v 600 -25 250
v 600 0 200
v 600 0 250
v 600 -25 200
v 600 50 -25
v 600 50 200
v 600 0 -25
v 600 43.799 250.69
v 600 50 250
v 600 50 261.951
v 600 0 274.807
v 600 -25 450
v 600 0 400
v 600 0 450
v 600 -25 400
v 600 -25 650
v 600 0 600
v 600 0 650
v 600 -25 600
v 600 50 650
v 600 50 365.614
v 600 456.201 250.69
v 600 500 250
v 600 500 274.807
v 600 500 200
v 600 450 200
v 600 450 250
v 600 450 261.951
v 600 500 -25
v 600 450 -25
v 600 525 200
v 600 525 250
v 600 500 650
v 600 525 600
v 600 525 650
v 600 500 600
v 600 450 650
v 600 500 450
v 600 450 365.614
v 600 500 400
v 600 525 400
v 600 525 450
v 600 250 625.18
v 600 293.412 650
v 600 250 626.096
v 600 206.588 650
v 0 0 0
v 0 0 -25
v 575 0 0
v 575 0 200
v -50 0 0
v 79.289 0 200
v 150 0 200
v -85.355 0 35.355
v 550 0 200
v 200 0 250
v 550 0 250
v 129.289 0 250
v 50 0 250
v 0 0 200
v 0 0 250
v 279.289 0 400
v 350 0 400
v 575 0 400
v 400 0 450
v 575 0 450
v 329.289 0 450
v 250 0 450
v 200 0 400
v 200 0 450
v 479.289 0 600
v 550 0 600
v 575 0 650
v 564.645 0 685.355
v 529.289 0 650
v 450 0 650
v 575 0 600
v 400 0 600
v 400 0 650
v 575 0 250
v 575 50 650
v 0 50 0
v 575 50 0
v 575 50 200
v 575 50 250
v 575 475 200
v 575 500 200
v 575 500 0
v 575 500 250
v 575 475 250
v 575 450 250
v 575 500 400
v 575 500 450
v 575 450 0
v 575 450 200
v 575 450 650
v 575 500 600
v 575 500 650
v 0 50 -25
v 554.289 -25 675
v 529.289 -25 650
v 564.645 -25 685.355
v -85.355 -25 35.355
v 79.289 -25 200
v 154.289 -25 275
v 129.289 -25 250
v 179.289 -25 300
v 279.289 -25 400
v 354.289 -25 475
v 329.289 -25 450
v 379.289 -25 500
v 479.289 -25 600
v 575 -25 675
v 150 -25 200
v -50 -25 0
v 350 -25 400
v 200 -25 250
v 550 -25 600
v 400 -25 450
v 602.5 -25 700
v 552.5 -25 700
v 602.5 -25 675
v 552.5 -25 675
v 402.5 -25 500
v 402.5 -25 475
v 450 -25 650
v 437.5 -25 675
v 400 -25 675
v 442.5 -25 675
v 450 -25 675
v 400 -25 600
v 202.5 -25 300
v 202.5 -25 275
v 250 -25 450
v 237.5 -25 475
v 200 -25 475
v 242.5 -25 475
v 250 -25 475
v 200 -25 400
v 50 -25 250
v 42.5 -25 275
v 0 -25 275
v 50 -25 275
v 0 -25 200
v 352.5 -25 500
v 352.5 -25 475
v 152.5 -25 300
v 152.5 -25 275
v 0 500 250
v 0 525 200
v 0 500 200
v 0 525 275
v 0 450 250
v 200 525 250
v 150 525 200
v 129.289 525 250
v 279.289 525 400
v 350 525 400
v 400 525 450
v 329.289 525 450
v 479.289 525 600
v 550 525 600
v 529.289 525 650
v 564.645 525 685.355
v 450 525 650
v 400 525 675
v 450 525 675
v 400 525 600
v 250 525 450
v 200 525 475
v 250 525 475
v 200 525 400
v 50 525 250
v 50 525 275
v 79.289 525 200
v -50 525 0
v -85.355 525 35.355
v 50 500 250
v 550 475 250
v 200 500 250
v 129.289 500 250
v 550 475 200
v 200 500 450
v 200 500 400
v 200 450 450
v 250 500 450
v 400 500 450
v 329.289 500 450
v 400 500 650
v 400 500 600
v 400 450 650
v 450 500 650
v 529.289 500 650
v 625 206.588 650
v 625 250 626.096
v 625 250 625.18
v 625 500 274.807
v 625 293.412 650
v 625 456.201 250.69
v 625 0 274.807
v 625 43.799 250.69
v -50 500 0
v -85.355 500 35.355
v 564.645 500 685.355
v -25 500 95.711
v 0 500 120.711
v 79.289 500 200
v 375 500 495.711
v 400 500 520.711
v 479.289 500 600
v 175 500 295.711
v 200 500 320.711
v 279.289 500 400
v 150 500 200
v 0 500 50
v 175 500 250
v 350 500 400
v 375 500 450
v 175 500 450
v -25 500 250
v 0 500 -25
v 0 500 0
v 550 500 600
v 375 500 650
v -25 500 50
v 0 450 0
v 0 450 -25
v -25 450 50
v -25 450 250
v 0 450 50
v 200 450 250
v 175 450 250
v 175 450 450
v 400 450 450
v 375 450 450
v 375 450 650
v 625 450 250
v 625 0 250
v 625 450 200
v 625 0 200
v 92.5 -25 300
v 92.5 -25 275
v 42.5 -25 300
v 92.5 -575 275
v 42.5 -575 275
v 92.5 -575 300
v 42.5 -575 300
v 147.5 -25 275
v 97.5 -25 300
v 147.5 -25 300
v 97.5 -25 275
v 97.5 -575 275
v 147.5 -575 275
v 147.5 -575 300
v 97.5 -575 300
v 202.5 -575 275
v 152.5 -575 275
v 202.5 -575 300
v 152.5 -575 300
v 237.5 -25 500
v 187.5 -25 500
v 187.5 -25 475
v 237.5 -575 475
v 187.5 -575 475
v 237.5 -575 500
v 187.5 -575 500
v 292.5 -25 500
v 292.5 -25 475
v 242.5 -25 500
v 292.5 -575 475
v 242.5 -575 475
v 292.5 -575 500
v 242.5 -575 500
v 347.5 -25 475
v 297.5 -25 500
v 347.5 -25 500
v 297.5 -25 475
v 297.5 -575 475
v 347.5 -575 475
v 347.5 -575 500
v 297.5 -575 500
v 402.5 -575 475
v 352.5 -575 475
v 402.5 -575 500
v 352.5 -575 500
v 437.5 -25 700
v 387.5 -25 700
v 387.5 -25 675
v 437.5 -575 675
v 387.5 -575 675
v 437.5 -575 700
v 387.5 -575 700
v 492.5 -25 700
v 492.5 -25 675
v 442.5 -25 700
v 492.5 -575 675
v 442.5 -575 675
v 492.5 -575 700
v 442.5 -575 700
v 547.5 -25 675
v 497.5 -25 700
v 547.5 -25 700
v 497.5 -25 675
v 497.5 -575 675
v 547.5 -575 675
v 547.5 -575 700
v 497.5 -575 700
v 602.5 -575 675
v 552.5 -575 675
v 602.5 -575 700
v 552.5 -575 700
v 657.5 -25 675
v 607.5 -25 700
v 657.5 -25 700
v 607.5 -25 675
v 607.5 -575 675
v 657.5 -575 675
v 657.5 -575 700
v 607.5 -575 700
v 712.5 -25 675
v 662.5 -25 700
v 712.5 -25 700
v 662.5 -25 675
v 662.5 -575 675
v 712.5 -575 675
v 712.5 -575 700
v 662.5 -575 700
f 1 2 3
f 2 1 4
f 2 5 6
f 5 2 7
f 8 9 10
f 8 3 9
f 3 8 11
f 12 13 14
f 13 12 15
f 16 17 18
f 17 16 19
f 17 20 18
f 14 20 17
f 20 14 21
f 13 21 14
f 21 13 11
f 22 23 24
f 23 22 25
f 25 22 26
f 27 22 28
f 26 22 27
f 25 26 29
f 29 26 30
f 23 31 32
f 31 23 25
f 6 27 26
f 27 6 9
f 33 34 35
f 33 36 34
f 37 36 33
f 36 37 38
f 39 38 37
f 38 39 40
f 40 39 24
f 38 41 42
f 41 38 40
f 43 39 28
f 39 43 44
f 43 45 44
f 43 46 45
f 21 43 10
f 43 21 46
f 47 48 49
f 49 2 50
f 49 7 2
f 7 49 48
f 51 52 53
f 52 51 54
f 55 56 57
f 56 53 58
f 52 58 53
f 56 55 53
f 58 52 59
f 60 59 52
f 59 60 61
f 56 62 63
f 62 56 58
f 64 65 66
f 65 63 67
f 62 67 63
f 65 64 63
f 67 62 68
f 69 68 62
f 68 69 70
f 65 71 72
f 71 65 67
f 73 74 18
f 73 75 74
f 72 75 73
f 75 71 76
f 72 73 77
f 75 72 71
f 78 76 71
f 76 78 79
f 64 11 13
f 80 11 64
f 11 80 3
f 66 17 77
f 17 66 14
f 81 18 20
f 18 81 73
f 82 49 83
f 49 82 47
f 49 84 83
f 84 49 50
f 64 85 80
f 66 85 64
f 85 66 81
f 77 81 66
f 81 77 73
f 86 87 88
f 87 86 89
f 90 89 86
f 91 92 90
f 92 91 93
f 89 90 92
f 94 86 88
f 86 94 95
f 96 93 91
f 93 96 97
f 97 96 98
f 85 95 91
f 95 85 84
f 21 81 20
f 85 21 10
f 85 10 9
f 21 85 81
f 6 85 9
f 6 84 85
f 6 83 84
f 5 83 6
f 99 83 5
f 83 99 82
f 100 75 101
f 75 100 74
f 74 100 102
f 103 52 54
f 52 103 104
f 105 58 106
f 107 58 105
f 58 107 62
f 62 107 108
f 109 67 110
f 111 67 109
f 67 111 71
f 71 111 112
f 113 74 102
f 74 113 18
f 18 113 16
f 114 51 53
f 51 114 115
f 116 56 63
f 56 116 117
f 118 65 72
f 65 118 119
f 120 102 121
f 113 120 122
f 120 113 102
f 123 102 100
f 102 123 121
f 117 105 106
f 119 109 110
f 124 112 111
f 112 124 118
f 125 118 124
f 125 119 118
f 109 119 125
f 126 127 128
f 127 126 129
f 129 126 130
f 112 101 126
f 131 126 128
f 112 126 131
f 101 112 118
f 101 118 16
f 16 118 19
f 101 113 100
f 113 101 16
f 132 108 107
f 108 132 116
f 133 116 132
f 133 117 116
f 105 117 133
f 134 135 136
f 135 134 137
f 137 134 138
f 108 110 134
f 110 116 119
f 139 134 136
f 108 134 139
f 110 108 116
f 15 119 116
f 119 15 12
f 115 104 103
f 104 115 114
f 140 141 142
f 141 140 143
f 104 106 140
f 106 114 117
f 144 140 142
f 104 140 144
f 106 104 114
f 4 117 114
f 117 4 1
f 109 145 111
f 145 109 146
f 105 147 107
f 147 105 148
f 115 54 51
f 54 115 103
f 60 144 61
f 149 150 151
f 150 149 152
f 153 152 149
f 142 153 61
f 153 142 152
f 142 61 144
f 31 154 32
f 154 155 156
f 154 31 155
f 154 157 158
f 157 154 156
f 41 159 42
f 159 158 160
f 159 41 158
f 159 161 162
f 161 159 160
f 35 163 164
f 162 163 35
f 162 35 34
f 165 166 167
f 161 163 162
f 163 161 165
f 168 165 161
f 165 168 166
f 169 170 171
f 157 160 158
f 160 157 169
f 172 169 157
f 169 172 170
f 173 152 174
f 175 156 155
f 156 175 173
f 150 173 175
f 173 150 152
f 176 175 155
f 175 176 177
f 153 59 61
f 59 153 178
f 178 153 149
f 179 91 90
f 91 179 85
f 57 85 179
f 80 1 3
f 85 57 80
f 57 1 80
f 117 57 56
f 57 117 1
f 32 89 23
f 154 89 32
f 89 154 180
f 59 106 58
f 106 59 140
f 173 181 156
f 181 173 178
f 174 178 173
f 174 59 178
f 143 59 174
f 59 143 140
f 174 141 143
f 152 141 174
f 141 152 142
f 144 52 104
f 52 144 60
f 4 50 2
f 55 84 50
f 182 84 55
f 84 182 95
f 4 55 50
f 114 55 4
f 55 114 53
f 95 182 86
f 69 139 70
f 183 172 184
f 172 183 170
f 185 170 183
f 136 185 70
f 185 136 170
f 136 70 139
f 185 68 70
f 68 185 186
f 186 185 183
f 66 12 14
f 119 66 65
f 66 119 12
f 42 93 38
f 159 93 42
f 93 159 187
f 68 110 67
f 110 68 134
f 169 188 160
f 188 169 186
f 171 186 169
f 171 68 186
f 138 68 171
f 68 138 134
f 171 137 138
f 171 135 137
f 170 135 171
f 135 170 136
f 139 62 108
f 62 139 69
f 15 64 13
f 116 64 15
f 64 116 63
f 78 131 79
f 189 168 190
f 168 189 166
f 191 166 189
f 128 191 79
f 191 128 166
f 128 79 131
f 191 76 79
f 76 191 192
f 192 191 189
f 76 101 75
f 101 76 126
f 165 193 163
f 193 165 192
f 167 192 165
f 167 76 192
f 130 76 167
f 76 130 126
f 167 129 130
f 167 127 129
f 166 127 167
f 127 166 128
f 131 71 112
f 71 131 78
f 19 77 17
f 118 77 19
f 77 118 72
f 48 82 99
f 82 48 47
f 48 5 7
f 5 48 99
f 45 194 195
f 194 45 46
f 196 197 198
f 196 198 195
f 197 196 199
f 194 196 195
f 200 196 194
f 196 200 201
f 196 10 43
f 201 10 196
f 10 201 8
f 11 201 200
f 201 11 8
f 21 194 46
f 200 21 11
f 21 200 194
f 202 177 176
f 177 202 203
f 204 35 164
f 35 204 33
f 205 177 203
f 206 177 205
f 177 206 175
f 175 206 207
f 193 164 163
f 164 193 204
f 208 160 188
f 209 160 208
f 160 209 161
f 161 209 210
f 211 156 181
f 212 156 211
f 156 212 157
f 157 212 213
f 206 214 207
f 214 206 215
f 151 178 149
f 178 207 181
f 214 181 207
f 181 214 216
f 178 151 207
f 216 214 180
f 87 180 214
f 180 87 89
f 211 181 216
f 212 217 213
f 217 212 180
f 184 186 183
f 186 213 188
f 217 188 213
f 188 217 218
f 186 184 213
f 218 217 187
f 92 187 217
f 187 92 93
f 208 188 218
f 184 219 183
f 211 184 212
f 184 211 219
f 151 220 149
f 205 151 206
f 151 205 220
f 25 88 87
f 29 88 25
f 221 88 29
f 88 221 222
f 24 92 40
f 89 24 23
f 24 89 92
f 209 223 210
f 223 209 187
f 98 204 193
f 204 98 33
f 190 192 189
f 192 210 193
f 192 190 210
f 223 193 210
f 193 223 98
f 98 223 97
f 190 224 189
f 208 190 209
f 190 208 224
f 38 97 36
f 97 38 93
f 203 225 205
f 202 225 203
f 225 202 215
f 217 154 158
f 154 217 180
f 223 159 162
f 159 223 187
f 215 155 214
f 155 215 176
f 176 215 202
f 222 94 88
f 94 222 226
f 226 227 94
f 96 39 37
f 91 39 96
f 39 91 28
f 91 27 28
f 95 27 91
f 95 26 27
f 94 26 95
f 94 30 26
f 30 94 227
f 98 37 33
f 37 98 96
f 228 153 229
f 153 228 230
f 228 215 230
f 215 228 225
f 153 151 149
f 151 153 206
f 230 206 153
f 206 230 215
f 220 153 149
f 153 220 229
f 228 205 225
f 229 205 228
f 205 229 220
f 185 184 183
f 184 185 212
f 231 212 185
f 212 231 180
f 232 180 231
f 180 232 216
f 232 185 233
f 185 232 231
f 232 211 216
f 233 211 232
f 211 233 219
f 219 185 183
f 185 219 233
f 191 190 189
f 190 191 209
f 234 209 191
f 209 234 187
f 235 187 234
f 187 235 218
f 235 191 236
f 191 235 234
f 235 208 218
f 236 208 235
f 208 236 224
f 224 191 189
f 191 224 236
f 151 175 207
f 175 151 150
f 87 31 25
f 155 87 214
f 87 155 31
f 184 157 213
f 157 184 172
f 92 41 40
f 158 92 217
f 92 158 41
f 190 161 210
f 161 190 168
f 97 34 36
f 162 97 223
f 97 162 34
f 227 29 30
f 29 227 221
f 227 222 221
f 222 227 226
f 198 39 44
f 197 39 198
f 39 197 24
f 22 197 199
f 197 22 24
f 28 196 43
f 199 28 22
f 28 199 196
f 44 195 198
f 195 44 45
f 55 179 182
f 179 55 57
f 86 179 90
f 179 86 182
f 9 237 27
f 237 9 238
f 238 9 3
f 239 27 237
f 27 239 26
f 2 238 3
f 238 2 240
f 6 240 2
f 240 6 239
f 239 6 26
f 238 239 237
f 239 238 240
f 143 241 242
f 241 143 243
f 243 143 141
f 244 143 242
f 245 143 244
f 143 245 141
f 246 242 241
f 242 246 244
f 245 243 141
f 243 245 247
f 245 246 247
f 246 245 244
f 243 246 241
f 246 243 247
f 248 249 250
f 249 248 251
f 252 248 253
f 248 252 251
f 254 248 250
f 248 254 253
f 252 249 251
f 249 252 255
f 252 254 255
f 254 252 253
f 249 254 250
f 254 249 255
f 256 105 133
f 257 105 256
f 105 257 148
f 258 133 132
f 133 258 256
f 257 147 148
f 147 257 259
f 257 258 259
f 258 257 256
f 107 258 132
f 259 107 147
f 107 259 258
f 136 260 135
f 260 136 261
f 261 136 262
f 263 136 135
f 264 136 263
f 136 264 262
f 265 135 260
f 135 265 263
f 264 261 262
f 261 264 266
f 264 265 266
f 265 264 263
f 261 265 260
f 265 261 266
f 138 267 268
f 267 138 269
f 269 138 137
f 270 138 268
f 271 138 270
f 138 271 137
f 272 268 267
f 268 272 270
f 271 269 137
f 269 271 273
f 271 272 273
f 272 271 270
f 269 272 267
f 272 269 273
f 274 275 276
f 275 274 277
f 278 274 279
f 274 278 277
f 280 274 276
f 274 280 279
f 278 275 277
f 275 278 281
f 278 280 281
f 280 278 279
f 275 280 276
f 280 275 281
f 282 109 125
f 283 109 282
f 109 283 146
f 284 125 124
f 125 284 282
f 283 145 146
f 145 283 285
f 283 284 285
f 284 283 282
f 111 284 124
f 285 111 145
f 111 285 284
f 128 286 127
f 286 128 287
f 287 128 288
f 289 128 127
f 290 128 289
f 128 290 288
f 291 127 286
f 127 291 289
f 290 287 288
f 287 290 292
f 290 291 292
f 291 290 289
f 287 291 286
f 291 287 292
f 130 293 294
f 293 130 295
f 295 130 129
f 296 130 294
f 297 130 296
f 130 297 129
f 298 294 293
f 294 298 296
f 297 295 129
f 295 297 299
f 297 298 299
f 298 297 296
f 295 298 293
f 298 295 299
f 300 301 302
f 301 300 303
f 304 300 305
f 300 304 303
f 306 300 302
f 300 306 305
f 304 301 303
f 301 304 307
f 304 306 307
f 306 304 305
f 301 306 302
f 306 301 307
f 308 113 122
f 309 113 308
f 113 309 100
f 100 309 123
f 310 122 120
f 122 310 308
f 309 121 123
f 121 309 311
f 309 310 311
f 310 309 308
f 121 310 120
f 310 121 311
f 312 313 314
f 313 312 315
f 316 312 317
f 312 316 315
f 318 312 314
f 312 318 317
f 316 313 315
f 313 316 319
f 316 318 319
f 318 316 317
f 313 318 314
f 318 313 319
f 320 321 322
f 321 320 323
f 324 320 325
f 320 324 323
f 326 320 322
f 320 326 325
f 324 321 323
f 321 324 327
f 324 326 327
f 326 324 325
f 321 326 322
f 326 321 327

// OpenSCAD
// Archiyou -> OpenSCAD  |  script: simplestep  |  units: mm
// OpenSCAD has no units: coordinates are in mm.
// Parts: 36 CSG, 4 baked, 0 2D
//   baked: Mesh (cutoffBy() kept one piece of a side that fell apart)
//   baked: beamDiagonal (cutoffBy() kept one piece of a side that fell apart)
//   baked: beamDiagonal_2 (cutoffBy() kept one piece of a side that fell apart)
//   baked: Mesh_12 (cutoffBy() kept one piece of a side that fell apart)
// Skipped: stepProfile (open curve), diagonal (open curve), verticalBack (open curve)
// Parameters at export, for reference only (nothing in this file is linked to them):
//   HEIGHT = 60
//   WIDTH = 50
//   BEAM_WIDTH = 50
//   BEAM_THICKNESS = 25
//   WITH_TREADS = true

$fn = 32;
PART = "";

// beamVertical  (layer diagram)
module beamVertical() {
    color([0, 0, 1]) multmatrix([[0, 0, -1, 600], [0, 1, 0, 0], [1, 0, 0, 0], [0, 0, 0, 1]]) linear_extrude(height = 25) polygon([[0, 0], [650, 0], [650, 50], [0, 50]]);
}

// Mesh  (layer diagram): baked, cutoffBy() kept one piece of a side that fell apart
module Mesh() {
    color([0, 0, 1]) polyhedron(
        points = [[564.644660941, -25, 685.355339059], [-85.3553390593, -25, 35.3553390593], [-85.3553390593, 0, 35.3553390593], [564.644660941, 0, 685.355339059], [-50, -25, 0], [600, -25, 650], [600, 0, 650], [-50, 0, 0]],
        faces = [[0, 1, 2, 3], [4, 5, 6, 7], [4, 1, 0, 5], [5, 0, 3, 6], [2, 7, 6, 3], [4, 7, 2, 1]]
    );
}

// beamDiagonal  (layer side): baked, cutoffBy() kept one piece of a side that fell apart
module beamDiagonal() {
    color([1, 0, 0]) polyhedron(
        points = [[-50, 0, 0], [600, 0, 650], [564.644660941, 0, 685.355339059], [-85.3553390593, 0, 35.3553390593], [-85.3553390593, -25, 35.3553390593], [-50, -25, 0], [600, -25, 650], [564.644660941, -25, 685.355339059]],
        faces = [[0, 1, 2, 3], [0, 3, 4, 5], [1, 0, 5, 6], [4, 3, 2, 7], [1, 6, 7, 2], [5, 4, 7, 6]]
    );
}

// Mesh  (layer side)
module Mesh_2() {
    color([1, 0, 0]) multmatrix([[0, 0, 1, 0], [1, 0, 0, -25], [0, 1, 0, 250], [0, 0, 0, 1]]) linear_extrude(height = 50) polygon([[0, 0], [550, 0], [550, 25], [0, 25]]);
}

// Mesh  (layer side)
module Mesh_3() {
    color([1, 0, 0]) multmatrix([[1, 0, 0, 0], [0, 0, -1, 0], [0, 1, 0, 250], [0, 0, 0, 1]]) linear_extrude(height = 25) polygon([[0, 0], [600, 0], [600, -50], [0, -50]]);
}

// Mesh  (layer side)
module Mesh_4() {
    color([1, 0, 0]) multmatrix([[1, 0, 0, 0], [0, 0, -1, 0], [0, 1, 0, 250], [0, 0, 0, 1]]) linear_extrude(height = 25) polygon([[0, 0], [600, 0], [600, -50], [0, -50]]);
}

// Mesh  (layer side)
module Mesh_5() {
    color([1, 0, 0]) multmatrix([[0, 0, 1, 200], [1, 0, 0, -25], [0, 1, 0, 450], [0, 0, 0, 1]]) linear_extrude(height = 50) polygon([[0, 0], [550, 0], [550, 25], [0, 25]]);
}

// Mesh  (layer side)
module Mesh_6() {
    color([1, 0, 0]) multmatrix([[1, 0, 0, 200], [0, 0, -1, 0], [0, 1, 0, 450], [0, 0, 0, 1]]) linear_extrude(height = 25) polygon([[0, 0], [400, 0], [400, -50], [0, -50]]);
}

// Mesh  (layer side)
module Mesh_7() {
    color([1, 0, 0]) multmatrix([[1, 0, 0, 200], [0, 0, -1, 0], [0, 1, 0, 450], [0, 0, 0, 1]]) linear_extrude(height = 25) polygon([[0, 0], [400, 0], [400, -50], [0, -50]]);
}

// Mesh  (layer side)
module Mesh_8() {
    color([1, 0, 0]) multmatrix([[0, 0, 1, 400], [1, 0, 0, -25], [0, 1, 0, 650], [0, 0, 0, 1]]) linear_extrude(height = 50) polygon([[0, 0], [550, 0], [550, 25], [0, 25]]);
}

// Mesh  (layer side)
module Mesh_9() {
    color([1, 0, 0]) multmatrix([[1, 0, 0, 400], [0, 0, -1, 0], [0, 1, 0, 650], [0, 0, 0, 1]]) linear_extrude(height = 25) polygon([[0, 0], [200, 0], [200, -50], [0, -50]]);
}

// Mesh  (layer side)
module Mesh_10() {
    color([1, 0, 0]) multmatrix([[1, 0, 0, 400], [0, 0, -1, 0], [0, 1, 0, 650], [0, 0, 0, 1]]) linear_extrude(height = 25) polygon([[0, 0], [200, 0], [200, -50], [0, -50]]);
}

// beamVerticalCrossed  (layer side)
module beamVerticalCrossed() {
    color([1, 0, 0]) multmatrix([[0, 0, -1, 600], [1, 0, 0, 0], [0, -1, 0, 0], [0, 0, 0, 1]]) linear_extrude(height = 600) polygon([[0, 0], [50, 0], [50, 25], [0, 25]]);
}

// Mesh  (layer side)
module Mesh_11() {
    color([1, 0, 0]) multmatrix([[0, 0, 1, 600], [0.482333958742, -0.875987415574, 0, 0], [0.875987415574, 0.482333958742, 0, 274.806946918], [0, 0, 0, 1]]) linear_extrude(height = 25) polygon([[0, 0], [428.308725002, 0], [428.308725002, -50], [0, -50]]);
}

// beamDiagonalRight  (layer side)
module beamDiagonalRight() {
    color([1, 0, 0]) multmatrix([[0, 0, 1, 600], [0.482333958742, -0.875987415574, 0, 0], [0.875987415574, 0.482333958742, 0, 274.806946918], [0, 0, 0, 1]]) linear_extrude(height = 25) polygon([[0, 0], [428.308725002, 0], [428.308725002, -50], [0, -50]]);
}

// beamDiagonal  (layer side): baked, cutoffBy() kept one piece of a side that fell apart
module beamDiagonal_2() {
    color([1, 0, 0]) polyhedron(
        points = [[-85.3553390593, 525, 35.3553390593], [-85.3553390593, 500, 35.3553390593], [-50, 500, 0], [-50, 525, 0], [564.644660941, 500, 685.355339059], [600, 500, 650], [600, 525, 650], [564.644660941, 525, 685.355339059]],
        faces = [[0, 1, 2, 3], [1, 4, 5, 2], [6, 7, 0, 3], [5, 4, 7, 6], [1, 0, 7, 4], [3, 2, 5, 6]]
    );
}

// beamVertical  (layer side)
module beamVertical_2() {
    color([1, 0, 0]) multmatrix([[0, 0, -1, 600], [0, -1, 0, 500], [1, 0, 0, 0], [0, 0, 0, 1]]) linear_extrude(height = 25) polygon([[0, 0], [650, 0], [650, 50], [0, 50]]);
}

// Mesh  (layer side): baked, cutoffBy() kept one piece of a side that fell apart
module Mesh_12() {
    color([1, 0, 0]) polyhedron(
        points = [[-25, 450, 250], [-25, 450, 50], [0, 450, 50], [0, 450, 250], [0, 500, 50], [0, 500, 250], [-25, 500, 50], [-25, 500, 250]],
        faces = [[3, 2, 1, 0], [2, 3, 5, 4], [2, 4, 6, 1], [7, 5, 3, 0], [6, 7, 0, 1], [7, 6, 4, 5]]
    );
}

// Mesh  (layer side)
module Mesh_13() {
    color([1, 0, 0]) multmatrix([[0, 0, -1, 200], [0, -1, 0, 500], [1, 0, 0, 250], [0, 0, 0, 1]]) linear_extrude(height = 25) polygon([[0, 0], [200, 0], [200, 50], [0, 50]]);
}

// Mesh  (layer side)
module Mesh_14() {
    color([1, 0, 0]) multmatrix([[0, 0, -1, 400], [0, -1, 0, 500], [1, 0, 0, 450], [0, 0, 0, 1]]) linear_extrude(height = 25) polygon([[0, 0], [200, 0], [200, 50], [0, 50]]);
}

// Mesh  (layer side)
module Mesh_15() {
    color([1, 0, 0]) multmatrix([[1, 0, 0, 0], [0, 0, 1, 500], [0, 1, 0, 250], [0, 0, 0, 1]]) linear_extrude(height = 25) polygon([[0, 0], [600, 0], [600, -50], [0, -50]]);
}

// Mesh  (layer side)
module Mesh_16() {
    color([1, 0, 0]) multmatrix([[1, 0, 0, 200], [0, 0, 1, 500], [0, 1, 0, 450], [0, 0, 0, 1]]) linear_extrude(height = 25) polygon([[0, 0], [400, 0], [400, -50], [0, -50]]);
}

// Mesh  (layer side)
module Mesh_17() {
    color([1, 0, 0]) multmatrix([[1, 0, 0, 400], [0, 0, 1, 500], [0, 1, 0, 650], [0, 0, 0, 1]]) linear_extrude(height = 25) polygon([[0, 0], [200, 0], [200, -50], [0, -50]]);
}

// beamVerticalCrossed  (layer side)
module beamVerticalCrossed_2() {
    color([1, 0, 0]) multmatrix([[0, 0, -1, 600], [-1, 0, 0, 500], [0, -1, 0, 0], [0, 0, 0, 1]]) linear_extrude(height = 600) polygon([[0, 0], [50, 0], [50, 25], [0, 25]]);
}

// beamDiagonalLeft  (layer side)
module beamDiagonalLeft() {
    color([1, 0, 0]) multmatrix([[0, 0, 1, 600], [-0.482333958742, 0.875987415574, 0, 500], [0.875987415574, 0.482333958742, 0, 274.806946918], [0, 0, 0, 1]]) linear_extrude(height = 25) polygon([[0, 0], [428.308725002, 0], [428.308725002, -50], [0, -50]]);
}

// beamLateralBottomFront  (layer side)
module beamLateralBottomFront() {
    color([1, 0, 0]) multmatrix([[0, 1, 0, 575], [1, 0, 0, -25], [0, 0, -1, 250], [0, 0, 0, 1]]) linear_extrude(height = 50) polygon([[0, 0], [500, 0], [500, -25], [0, -25]]);
}

// beamLateralBottomBack  (layer side)
module beamLateralBottomBack() {
    color([1, 0, 0]) multmatrix([[0, 1, 0, 625], [1, 0, 0, 0], [0, 0, -1, 250], [0, 0, 0, 1]]) linear_extrude(height = 50) polygon([[0, 0], [450, 0], [450, -25], [0, -25]]);
}

// threadPlank21  (layer threads)
module threadPlank21() {
    color([0, 0.502, 0]) multmatrix([[1, 0, 0, 42.5], [0, 0, -1, -25], [0, 1, 0, 275], [0, 0, 0, 1]]) linear_extrude(height = 550) polygon([[0, 0], [50, 0], [50, 25], [0, 25]]);
}

// threadPlank31  (layer threads)
module threadPlank31() {
    color([0, 0.502, 0]) multmatrix([[1, 0, 0, 97.5], [0, 0, -1, -25], [0, 1, 0, 275], [0, 0, 0, 1]]) linear_extrude(height = 550) polygon([[0, 0], [50, 0], [50, 25], [0, 25]]);
}

// threadPlank41  (layer threads)
module threadPlank41() {
    color([0, 0.502, 0]) multmatrix([[1, 0, 0, 152.5], [0, 0, -1, -25], [0, 1, 0, 275], [0, 0, 0, 1]]) linear_extrude(height = 550) polygon([[0, 0], [50, 0], [50, 25], [0, 25]]);
}

// threadPlank11  (layer threads)
module threadPlank11() {
    color([0, 0.502, 0]) multmatrix([[1, 0, 0, 187.5], [0, 0, -1, -25], [0, 1, 0, 475], [0, 0, 0, 1]]) linear_extrude(height = 550) polygon([[0, 0], [50, 0], [50, 25], [0, 25]]);
}

// threadPlank21  (layer threads)
module threadPlank21_2() {
    color([0, 0.502, 0]) multmatrix([[1, 0, 0, 242.5], [0, 0, -1, -25], [0, 1, 0, 475], [0, 0, 0, 1]]) linear_extrude(height = 550) polygon([[0, 0], [50, 0], [50, 25], [0, 25]]);
}

// threadPlank31  (layer threads)
module threadPlank31_2() {
    color([0, 0.502, 0]) multmatrix([[1, 0, 0, 297.5], [0, 0, -1, -25], [0, 1, 0, 475], [0, 0, 0, 1]]) linear_extrude(height = 550) polygon([[0, 0], [50, 0], [50, 25], [0, 25]]);
}

// threadPlank41  (layer threads)
module threadPlank41_2() {
    color([0, 0.502, 0]) multmatrix([[1, 0, 0, 352.5], [0, 0, -1, -25], [0, 1, 0, 475], [0, 0, 0, 1]]) linear_extrude(height = 550) polygon([[0, 0], [50, 0], [50, 25], [0, 25]]);
}

// topThreadPlank11  (layer threads)
module topThreadPlank11() {
    color([0, 0.502, 0]) multmatrix([[1, 0, 0, 387.5], [0, 0, -1, -25], [0, 1, 0, 675], [0, 0, 0, 1]]) linear_extrude(height = 550) polygon([[0, 0], [50, 0], [50, 25], [0, 25]]);
}

// topThreadPlank21  (layer threads)
module topThreadPlank21() {
    color([0, 0.502, 0]) multmatrix([[1, 0, 0, 442.5], [0, 0, -1, -25], [0, 1, 0, 675], [0, 0, 0, 1]]) linear_extrude(height = 550) polygon([[0, 0], [50, 0], [50, 25], [0, 25]]);
}

// topThreadPlank31  (layer threads)
module topThreadPlank31() {
    color([0, 0.502, 0]) multmatrix([[1, 0, 0, 497.5], [0, 0, -1, -25], [0, 1, 0, 675], [0, 0, 0, 1]]) linear_extrude(height = 550) polygon([[0, 0], [50, 0], [50, 25], [0, 25]]);
}

// topThreadPlank41  (layer threads)
module topThreadPlank41() {
    color([0, 0.502, 0]) multmatrix([[1, 0, 0, 552.5], [0, 0, -1, -25], [0, 1, 0, 675], [0, 0, 0, 1]]) linear_extrude(height = 550) polygon([[0, 0], [50, 0], [50, 25], [0, 25]]);
}

// topThreadPlank51  (layer threads)
module topThreadPlank51() {
    color([0, 0.502, 0]) multmatrix([[1, 0, 0, 607.5], [0, 0, -1, -25], [0, 1, 0, 675], [0, 0, 0, 1]]) linear_extrude(height = 550) polygon([[0, 0], [50, 0], [50, 25], [0, 25]]);
}

// topThreadPlank61  (layer threads)
module topThreadPlank61() {
    color([0, 0.502, 0]) multmatrix([[1, 0, 0, 662.5], [0, 0, -1, -25], [0, 1, 0, 675], [0, 0, 0, 1]]) linear_extrude(height = 550) polygon([[0, 0], [50, 0], [50, 25], [0, 25]]);
}

// 3D parts
if (PART == "" || PART == "beamVertical") beamVertical();
if (PART == "" || PART == "Mesh") Mesh();
if (PART == "" || PART == "beamDiagonal") beamDiagonal();
if (PART == "" || PART == "Mesh_2") Mesh_2();
if (PART == "" || PART == "Mesh_3") Mesh_3();
if (PART == "" || PART == "Mesh_4") Mesh_4();
if (PART == "" || PART == "Mesh_5") Mesh_5();
if (PART == "" || PART == "Mesh_6") Mesh_6();
if (PART == "" || PART == "Mesh_7") Mesh_7();
if (PART == "" || PART == "Mesh_8") Mesh_8();
if (PART == "" || PART == "Mesh_9") Mesh_9();
if (PART == "" || PART == "Mesh_10") Mesh_10();
if (PART == "" || PART == "beamVerticalCrossed") beamVerticalCrossed();
if (PART == "" || PART == "Mesh_11") Mesh_11();
if (PART == "" || PART == "beamDiagonalRight") beamDiagonalRight();
if (PART == "" || PART == "beamDiagonal_2") beamDiagonal_2();
if (PART == "" || PART == "beamVertical_2") beamVertical_2();
if (PART == "" || PART == "Mesh_12") Mesh_12();
if (PART == "" || PART == "Mesh_13") Mesh_13();
if (PART == "" || PART == "Mesh_14") Mesh_14();
if (PART == "" || PART == "Mesh_15") Mesh_15();
if (PART == "" || PART == "Mesh_16") Mesh_16();
if (PART == "" || PART == "Mesh_17") Mesh_17();
if (PART == "" || PART == "beamVerticalCrossed_2") beamVerticalCrossed_2();
if (PART == "" || PART == "beamDiagonalLeft") beamDiagonalLeft();
if (PART == "" || PART == "beamLateralBottomFront") beamLateralBottomFront();
if (PART == "" || PART == "beamLateralBottomBack") beamLateralBottomBack();
if (PART == "" || PART == "threadPlank21") threadPlank21();
if (PART == "" || PART == "threadPlank31") threadPlank31();
if (PART == "" || PART == "threadPlank41") threadPlank41();
if (PART == "" || PART == "threadPlank11") threadPlank11();
if (PART == "" || PART == "threadPlank21_2") threadPlank21_2();
if (PART == "" || PART == "threadPlank31_2") threadPlank31_2();
if (PART == "" || PART == "threadPlank41_2") threadPlank41_2();
if (PART == "" || PART == "topThreadPlank11") topThreadPlank11();
if (PART == "" || PART == "topThreadPlank21") topThreadPlank21();
if (PART == "" || PART == "topThreadPlank31") topThreadPlank31();
if (PART == "" || PART == "topThreadPlank41") topThreadPlank41();
if (PART == "" || PART == "topThreadPlank51") topThreadPlank51();
if (PART == "" || PART == "topThreadPlank61") topThreadPlank61();
